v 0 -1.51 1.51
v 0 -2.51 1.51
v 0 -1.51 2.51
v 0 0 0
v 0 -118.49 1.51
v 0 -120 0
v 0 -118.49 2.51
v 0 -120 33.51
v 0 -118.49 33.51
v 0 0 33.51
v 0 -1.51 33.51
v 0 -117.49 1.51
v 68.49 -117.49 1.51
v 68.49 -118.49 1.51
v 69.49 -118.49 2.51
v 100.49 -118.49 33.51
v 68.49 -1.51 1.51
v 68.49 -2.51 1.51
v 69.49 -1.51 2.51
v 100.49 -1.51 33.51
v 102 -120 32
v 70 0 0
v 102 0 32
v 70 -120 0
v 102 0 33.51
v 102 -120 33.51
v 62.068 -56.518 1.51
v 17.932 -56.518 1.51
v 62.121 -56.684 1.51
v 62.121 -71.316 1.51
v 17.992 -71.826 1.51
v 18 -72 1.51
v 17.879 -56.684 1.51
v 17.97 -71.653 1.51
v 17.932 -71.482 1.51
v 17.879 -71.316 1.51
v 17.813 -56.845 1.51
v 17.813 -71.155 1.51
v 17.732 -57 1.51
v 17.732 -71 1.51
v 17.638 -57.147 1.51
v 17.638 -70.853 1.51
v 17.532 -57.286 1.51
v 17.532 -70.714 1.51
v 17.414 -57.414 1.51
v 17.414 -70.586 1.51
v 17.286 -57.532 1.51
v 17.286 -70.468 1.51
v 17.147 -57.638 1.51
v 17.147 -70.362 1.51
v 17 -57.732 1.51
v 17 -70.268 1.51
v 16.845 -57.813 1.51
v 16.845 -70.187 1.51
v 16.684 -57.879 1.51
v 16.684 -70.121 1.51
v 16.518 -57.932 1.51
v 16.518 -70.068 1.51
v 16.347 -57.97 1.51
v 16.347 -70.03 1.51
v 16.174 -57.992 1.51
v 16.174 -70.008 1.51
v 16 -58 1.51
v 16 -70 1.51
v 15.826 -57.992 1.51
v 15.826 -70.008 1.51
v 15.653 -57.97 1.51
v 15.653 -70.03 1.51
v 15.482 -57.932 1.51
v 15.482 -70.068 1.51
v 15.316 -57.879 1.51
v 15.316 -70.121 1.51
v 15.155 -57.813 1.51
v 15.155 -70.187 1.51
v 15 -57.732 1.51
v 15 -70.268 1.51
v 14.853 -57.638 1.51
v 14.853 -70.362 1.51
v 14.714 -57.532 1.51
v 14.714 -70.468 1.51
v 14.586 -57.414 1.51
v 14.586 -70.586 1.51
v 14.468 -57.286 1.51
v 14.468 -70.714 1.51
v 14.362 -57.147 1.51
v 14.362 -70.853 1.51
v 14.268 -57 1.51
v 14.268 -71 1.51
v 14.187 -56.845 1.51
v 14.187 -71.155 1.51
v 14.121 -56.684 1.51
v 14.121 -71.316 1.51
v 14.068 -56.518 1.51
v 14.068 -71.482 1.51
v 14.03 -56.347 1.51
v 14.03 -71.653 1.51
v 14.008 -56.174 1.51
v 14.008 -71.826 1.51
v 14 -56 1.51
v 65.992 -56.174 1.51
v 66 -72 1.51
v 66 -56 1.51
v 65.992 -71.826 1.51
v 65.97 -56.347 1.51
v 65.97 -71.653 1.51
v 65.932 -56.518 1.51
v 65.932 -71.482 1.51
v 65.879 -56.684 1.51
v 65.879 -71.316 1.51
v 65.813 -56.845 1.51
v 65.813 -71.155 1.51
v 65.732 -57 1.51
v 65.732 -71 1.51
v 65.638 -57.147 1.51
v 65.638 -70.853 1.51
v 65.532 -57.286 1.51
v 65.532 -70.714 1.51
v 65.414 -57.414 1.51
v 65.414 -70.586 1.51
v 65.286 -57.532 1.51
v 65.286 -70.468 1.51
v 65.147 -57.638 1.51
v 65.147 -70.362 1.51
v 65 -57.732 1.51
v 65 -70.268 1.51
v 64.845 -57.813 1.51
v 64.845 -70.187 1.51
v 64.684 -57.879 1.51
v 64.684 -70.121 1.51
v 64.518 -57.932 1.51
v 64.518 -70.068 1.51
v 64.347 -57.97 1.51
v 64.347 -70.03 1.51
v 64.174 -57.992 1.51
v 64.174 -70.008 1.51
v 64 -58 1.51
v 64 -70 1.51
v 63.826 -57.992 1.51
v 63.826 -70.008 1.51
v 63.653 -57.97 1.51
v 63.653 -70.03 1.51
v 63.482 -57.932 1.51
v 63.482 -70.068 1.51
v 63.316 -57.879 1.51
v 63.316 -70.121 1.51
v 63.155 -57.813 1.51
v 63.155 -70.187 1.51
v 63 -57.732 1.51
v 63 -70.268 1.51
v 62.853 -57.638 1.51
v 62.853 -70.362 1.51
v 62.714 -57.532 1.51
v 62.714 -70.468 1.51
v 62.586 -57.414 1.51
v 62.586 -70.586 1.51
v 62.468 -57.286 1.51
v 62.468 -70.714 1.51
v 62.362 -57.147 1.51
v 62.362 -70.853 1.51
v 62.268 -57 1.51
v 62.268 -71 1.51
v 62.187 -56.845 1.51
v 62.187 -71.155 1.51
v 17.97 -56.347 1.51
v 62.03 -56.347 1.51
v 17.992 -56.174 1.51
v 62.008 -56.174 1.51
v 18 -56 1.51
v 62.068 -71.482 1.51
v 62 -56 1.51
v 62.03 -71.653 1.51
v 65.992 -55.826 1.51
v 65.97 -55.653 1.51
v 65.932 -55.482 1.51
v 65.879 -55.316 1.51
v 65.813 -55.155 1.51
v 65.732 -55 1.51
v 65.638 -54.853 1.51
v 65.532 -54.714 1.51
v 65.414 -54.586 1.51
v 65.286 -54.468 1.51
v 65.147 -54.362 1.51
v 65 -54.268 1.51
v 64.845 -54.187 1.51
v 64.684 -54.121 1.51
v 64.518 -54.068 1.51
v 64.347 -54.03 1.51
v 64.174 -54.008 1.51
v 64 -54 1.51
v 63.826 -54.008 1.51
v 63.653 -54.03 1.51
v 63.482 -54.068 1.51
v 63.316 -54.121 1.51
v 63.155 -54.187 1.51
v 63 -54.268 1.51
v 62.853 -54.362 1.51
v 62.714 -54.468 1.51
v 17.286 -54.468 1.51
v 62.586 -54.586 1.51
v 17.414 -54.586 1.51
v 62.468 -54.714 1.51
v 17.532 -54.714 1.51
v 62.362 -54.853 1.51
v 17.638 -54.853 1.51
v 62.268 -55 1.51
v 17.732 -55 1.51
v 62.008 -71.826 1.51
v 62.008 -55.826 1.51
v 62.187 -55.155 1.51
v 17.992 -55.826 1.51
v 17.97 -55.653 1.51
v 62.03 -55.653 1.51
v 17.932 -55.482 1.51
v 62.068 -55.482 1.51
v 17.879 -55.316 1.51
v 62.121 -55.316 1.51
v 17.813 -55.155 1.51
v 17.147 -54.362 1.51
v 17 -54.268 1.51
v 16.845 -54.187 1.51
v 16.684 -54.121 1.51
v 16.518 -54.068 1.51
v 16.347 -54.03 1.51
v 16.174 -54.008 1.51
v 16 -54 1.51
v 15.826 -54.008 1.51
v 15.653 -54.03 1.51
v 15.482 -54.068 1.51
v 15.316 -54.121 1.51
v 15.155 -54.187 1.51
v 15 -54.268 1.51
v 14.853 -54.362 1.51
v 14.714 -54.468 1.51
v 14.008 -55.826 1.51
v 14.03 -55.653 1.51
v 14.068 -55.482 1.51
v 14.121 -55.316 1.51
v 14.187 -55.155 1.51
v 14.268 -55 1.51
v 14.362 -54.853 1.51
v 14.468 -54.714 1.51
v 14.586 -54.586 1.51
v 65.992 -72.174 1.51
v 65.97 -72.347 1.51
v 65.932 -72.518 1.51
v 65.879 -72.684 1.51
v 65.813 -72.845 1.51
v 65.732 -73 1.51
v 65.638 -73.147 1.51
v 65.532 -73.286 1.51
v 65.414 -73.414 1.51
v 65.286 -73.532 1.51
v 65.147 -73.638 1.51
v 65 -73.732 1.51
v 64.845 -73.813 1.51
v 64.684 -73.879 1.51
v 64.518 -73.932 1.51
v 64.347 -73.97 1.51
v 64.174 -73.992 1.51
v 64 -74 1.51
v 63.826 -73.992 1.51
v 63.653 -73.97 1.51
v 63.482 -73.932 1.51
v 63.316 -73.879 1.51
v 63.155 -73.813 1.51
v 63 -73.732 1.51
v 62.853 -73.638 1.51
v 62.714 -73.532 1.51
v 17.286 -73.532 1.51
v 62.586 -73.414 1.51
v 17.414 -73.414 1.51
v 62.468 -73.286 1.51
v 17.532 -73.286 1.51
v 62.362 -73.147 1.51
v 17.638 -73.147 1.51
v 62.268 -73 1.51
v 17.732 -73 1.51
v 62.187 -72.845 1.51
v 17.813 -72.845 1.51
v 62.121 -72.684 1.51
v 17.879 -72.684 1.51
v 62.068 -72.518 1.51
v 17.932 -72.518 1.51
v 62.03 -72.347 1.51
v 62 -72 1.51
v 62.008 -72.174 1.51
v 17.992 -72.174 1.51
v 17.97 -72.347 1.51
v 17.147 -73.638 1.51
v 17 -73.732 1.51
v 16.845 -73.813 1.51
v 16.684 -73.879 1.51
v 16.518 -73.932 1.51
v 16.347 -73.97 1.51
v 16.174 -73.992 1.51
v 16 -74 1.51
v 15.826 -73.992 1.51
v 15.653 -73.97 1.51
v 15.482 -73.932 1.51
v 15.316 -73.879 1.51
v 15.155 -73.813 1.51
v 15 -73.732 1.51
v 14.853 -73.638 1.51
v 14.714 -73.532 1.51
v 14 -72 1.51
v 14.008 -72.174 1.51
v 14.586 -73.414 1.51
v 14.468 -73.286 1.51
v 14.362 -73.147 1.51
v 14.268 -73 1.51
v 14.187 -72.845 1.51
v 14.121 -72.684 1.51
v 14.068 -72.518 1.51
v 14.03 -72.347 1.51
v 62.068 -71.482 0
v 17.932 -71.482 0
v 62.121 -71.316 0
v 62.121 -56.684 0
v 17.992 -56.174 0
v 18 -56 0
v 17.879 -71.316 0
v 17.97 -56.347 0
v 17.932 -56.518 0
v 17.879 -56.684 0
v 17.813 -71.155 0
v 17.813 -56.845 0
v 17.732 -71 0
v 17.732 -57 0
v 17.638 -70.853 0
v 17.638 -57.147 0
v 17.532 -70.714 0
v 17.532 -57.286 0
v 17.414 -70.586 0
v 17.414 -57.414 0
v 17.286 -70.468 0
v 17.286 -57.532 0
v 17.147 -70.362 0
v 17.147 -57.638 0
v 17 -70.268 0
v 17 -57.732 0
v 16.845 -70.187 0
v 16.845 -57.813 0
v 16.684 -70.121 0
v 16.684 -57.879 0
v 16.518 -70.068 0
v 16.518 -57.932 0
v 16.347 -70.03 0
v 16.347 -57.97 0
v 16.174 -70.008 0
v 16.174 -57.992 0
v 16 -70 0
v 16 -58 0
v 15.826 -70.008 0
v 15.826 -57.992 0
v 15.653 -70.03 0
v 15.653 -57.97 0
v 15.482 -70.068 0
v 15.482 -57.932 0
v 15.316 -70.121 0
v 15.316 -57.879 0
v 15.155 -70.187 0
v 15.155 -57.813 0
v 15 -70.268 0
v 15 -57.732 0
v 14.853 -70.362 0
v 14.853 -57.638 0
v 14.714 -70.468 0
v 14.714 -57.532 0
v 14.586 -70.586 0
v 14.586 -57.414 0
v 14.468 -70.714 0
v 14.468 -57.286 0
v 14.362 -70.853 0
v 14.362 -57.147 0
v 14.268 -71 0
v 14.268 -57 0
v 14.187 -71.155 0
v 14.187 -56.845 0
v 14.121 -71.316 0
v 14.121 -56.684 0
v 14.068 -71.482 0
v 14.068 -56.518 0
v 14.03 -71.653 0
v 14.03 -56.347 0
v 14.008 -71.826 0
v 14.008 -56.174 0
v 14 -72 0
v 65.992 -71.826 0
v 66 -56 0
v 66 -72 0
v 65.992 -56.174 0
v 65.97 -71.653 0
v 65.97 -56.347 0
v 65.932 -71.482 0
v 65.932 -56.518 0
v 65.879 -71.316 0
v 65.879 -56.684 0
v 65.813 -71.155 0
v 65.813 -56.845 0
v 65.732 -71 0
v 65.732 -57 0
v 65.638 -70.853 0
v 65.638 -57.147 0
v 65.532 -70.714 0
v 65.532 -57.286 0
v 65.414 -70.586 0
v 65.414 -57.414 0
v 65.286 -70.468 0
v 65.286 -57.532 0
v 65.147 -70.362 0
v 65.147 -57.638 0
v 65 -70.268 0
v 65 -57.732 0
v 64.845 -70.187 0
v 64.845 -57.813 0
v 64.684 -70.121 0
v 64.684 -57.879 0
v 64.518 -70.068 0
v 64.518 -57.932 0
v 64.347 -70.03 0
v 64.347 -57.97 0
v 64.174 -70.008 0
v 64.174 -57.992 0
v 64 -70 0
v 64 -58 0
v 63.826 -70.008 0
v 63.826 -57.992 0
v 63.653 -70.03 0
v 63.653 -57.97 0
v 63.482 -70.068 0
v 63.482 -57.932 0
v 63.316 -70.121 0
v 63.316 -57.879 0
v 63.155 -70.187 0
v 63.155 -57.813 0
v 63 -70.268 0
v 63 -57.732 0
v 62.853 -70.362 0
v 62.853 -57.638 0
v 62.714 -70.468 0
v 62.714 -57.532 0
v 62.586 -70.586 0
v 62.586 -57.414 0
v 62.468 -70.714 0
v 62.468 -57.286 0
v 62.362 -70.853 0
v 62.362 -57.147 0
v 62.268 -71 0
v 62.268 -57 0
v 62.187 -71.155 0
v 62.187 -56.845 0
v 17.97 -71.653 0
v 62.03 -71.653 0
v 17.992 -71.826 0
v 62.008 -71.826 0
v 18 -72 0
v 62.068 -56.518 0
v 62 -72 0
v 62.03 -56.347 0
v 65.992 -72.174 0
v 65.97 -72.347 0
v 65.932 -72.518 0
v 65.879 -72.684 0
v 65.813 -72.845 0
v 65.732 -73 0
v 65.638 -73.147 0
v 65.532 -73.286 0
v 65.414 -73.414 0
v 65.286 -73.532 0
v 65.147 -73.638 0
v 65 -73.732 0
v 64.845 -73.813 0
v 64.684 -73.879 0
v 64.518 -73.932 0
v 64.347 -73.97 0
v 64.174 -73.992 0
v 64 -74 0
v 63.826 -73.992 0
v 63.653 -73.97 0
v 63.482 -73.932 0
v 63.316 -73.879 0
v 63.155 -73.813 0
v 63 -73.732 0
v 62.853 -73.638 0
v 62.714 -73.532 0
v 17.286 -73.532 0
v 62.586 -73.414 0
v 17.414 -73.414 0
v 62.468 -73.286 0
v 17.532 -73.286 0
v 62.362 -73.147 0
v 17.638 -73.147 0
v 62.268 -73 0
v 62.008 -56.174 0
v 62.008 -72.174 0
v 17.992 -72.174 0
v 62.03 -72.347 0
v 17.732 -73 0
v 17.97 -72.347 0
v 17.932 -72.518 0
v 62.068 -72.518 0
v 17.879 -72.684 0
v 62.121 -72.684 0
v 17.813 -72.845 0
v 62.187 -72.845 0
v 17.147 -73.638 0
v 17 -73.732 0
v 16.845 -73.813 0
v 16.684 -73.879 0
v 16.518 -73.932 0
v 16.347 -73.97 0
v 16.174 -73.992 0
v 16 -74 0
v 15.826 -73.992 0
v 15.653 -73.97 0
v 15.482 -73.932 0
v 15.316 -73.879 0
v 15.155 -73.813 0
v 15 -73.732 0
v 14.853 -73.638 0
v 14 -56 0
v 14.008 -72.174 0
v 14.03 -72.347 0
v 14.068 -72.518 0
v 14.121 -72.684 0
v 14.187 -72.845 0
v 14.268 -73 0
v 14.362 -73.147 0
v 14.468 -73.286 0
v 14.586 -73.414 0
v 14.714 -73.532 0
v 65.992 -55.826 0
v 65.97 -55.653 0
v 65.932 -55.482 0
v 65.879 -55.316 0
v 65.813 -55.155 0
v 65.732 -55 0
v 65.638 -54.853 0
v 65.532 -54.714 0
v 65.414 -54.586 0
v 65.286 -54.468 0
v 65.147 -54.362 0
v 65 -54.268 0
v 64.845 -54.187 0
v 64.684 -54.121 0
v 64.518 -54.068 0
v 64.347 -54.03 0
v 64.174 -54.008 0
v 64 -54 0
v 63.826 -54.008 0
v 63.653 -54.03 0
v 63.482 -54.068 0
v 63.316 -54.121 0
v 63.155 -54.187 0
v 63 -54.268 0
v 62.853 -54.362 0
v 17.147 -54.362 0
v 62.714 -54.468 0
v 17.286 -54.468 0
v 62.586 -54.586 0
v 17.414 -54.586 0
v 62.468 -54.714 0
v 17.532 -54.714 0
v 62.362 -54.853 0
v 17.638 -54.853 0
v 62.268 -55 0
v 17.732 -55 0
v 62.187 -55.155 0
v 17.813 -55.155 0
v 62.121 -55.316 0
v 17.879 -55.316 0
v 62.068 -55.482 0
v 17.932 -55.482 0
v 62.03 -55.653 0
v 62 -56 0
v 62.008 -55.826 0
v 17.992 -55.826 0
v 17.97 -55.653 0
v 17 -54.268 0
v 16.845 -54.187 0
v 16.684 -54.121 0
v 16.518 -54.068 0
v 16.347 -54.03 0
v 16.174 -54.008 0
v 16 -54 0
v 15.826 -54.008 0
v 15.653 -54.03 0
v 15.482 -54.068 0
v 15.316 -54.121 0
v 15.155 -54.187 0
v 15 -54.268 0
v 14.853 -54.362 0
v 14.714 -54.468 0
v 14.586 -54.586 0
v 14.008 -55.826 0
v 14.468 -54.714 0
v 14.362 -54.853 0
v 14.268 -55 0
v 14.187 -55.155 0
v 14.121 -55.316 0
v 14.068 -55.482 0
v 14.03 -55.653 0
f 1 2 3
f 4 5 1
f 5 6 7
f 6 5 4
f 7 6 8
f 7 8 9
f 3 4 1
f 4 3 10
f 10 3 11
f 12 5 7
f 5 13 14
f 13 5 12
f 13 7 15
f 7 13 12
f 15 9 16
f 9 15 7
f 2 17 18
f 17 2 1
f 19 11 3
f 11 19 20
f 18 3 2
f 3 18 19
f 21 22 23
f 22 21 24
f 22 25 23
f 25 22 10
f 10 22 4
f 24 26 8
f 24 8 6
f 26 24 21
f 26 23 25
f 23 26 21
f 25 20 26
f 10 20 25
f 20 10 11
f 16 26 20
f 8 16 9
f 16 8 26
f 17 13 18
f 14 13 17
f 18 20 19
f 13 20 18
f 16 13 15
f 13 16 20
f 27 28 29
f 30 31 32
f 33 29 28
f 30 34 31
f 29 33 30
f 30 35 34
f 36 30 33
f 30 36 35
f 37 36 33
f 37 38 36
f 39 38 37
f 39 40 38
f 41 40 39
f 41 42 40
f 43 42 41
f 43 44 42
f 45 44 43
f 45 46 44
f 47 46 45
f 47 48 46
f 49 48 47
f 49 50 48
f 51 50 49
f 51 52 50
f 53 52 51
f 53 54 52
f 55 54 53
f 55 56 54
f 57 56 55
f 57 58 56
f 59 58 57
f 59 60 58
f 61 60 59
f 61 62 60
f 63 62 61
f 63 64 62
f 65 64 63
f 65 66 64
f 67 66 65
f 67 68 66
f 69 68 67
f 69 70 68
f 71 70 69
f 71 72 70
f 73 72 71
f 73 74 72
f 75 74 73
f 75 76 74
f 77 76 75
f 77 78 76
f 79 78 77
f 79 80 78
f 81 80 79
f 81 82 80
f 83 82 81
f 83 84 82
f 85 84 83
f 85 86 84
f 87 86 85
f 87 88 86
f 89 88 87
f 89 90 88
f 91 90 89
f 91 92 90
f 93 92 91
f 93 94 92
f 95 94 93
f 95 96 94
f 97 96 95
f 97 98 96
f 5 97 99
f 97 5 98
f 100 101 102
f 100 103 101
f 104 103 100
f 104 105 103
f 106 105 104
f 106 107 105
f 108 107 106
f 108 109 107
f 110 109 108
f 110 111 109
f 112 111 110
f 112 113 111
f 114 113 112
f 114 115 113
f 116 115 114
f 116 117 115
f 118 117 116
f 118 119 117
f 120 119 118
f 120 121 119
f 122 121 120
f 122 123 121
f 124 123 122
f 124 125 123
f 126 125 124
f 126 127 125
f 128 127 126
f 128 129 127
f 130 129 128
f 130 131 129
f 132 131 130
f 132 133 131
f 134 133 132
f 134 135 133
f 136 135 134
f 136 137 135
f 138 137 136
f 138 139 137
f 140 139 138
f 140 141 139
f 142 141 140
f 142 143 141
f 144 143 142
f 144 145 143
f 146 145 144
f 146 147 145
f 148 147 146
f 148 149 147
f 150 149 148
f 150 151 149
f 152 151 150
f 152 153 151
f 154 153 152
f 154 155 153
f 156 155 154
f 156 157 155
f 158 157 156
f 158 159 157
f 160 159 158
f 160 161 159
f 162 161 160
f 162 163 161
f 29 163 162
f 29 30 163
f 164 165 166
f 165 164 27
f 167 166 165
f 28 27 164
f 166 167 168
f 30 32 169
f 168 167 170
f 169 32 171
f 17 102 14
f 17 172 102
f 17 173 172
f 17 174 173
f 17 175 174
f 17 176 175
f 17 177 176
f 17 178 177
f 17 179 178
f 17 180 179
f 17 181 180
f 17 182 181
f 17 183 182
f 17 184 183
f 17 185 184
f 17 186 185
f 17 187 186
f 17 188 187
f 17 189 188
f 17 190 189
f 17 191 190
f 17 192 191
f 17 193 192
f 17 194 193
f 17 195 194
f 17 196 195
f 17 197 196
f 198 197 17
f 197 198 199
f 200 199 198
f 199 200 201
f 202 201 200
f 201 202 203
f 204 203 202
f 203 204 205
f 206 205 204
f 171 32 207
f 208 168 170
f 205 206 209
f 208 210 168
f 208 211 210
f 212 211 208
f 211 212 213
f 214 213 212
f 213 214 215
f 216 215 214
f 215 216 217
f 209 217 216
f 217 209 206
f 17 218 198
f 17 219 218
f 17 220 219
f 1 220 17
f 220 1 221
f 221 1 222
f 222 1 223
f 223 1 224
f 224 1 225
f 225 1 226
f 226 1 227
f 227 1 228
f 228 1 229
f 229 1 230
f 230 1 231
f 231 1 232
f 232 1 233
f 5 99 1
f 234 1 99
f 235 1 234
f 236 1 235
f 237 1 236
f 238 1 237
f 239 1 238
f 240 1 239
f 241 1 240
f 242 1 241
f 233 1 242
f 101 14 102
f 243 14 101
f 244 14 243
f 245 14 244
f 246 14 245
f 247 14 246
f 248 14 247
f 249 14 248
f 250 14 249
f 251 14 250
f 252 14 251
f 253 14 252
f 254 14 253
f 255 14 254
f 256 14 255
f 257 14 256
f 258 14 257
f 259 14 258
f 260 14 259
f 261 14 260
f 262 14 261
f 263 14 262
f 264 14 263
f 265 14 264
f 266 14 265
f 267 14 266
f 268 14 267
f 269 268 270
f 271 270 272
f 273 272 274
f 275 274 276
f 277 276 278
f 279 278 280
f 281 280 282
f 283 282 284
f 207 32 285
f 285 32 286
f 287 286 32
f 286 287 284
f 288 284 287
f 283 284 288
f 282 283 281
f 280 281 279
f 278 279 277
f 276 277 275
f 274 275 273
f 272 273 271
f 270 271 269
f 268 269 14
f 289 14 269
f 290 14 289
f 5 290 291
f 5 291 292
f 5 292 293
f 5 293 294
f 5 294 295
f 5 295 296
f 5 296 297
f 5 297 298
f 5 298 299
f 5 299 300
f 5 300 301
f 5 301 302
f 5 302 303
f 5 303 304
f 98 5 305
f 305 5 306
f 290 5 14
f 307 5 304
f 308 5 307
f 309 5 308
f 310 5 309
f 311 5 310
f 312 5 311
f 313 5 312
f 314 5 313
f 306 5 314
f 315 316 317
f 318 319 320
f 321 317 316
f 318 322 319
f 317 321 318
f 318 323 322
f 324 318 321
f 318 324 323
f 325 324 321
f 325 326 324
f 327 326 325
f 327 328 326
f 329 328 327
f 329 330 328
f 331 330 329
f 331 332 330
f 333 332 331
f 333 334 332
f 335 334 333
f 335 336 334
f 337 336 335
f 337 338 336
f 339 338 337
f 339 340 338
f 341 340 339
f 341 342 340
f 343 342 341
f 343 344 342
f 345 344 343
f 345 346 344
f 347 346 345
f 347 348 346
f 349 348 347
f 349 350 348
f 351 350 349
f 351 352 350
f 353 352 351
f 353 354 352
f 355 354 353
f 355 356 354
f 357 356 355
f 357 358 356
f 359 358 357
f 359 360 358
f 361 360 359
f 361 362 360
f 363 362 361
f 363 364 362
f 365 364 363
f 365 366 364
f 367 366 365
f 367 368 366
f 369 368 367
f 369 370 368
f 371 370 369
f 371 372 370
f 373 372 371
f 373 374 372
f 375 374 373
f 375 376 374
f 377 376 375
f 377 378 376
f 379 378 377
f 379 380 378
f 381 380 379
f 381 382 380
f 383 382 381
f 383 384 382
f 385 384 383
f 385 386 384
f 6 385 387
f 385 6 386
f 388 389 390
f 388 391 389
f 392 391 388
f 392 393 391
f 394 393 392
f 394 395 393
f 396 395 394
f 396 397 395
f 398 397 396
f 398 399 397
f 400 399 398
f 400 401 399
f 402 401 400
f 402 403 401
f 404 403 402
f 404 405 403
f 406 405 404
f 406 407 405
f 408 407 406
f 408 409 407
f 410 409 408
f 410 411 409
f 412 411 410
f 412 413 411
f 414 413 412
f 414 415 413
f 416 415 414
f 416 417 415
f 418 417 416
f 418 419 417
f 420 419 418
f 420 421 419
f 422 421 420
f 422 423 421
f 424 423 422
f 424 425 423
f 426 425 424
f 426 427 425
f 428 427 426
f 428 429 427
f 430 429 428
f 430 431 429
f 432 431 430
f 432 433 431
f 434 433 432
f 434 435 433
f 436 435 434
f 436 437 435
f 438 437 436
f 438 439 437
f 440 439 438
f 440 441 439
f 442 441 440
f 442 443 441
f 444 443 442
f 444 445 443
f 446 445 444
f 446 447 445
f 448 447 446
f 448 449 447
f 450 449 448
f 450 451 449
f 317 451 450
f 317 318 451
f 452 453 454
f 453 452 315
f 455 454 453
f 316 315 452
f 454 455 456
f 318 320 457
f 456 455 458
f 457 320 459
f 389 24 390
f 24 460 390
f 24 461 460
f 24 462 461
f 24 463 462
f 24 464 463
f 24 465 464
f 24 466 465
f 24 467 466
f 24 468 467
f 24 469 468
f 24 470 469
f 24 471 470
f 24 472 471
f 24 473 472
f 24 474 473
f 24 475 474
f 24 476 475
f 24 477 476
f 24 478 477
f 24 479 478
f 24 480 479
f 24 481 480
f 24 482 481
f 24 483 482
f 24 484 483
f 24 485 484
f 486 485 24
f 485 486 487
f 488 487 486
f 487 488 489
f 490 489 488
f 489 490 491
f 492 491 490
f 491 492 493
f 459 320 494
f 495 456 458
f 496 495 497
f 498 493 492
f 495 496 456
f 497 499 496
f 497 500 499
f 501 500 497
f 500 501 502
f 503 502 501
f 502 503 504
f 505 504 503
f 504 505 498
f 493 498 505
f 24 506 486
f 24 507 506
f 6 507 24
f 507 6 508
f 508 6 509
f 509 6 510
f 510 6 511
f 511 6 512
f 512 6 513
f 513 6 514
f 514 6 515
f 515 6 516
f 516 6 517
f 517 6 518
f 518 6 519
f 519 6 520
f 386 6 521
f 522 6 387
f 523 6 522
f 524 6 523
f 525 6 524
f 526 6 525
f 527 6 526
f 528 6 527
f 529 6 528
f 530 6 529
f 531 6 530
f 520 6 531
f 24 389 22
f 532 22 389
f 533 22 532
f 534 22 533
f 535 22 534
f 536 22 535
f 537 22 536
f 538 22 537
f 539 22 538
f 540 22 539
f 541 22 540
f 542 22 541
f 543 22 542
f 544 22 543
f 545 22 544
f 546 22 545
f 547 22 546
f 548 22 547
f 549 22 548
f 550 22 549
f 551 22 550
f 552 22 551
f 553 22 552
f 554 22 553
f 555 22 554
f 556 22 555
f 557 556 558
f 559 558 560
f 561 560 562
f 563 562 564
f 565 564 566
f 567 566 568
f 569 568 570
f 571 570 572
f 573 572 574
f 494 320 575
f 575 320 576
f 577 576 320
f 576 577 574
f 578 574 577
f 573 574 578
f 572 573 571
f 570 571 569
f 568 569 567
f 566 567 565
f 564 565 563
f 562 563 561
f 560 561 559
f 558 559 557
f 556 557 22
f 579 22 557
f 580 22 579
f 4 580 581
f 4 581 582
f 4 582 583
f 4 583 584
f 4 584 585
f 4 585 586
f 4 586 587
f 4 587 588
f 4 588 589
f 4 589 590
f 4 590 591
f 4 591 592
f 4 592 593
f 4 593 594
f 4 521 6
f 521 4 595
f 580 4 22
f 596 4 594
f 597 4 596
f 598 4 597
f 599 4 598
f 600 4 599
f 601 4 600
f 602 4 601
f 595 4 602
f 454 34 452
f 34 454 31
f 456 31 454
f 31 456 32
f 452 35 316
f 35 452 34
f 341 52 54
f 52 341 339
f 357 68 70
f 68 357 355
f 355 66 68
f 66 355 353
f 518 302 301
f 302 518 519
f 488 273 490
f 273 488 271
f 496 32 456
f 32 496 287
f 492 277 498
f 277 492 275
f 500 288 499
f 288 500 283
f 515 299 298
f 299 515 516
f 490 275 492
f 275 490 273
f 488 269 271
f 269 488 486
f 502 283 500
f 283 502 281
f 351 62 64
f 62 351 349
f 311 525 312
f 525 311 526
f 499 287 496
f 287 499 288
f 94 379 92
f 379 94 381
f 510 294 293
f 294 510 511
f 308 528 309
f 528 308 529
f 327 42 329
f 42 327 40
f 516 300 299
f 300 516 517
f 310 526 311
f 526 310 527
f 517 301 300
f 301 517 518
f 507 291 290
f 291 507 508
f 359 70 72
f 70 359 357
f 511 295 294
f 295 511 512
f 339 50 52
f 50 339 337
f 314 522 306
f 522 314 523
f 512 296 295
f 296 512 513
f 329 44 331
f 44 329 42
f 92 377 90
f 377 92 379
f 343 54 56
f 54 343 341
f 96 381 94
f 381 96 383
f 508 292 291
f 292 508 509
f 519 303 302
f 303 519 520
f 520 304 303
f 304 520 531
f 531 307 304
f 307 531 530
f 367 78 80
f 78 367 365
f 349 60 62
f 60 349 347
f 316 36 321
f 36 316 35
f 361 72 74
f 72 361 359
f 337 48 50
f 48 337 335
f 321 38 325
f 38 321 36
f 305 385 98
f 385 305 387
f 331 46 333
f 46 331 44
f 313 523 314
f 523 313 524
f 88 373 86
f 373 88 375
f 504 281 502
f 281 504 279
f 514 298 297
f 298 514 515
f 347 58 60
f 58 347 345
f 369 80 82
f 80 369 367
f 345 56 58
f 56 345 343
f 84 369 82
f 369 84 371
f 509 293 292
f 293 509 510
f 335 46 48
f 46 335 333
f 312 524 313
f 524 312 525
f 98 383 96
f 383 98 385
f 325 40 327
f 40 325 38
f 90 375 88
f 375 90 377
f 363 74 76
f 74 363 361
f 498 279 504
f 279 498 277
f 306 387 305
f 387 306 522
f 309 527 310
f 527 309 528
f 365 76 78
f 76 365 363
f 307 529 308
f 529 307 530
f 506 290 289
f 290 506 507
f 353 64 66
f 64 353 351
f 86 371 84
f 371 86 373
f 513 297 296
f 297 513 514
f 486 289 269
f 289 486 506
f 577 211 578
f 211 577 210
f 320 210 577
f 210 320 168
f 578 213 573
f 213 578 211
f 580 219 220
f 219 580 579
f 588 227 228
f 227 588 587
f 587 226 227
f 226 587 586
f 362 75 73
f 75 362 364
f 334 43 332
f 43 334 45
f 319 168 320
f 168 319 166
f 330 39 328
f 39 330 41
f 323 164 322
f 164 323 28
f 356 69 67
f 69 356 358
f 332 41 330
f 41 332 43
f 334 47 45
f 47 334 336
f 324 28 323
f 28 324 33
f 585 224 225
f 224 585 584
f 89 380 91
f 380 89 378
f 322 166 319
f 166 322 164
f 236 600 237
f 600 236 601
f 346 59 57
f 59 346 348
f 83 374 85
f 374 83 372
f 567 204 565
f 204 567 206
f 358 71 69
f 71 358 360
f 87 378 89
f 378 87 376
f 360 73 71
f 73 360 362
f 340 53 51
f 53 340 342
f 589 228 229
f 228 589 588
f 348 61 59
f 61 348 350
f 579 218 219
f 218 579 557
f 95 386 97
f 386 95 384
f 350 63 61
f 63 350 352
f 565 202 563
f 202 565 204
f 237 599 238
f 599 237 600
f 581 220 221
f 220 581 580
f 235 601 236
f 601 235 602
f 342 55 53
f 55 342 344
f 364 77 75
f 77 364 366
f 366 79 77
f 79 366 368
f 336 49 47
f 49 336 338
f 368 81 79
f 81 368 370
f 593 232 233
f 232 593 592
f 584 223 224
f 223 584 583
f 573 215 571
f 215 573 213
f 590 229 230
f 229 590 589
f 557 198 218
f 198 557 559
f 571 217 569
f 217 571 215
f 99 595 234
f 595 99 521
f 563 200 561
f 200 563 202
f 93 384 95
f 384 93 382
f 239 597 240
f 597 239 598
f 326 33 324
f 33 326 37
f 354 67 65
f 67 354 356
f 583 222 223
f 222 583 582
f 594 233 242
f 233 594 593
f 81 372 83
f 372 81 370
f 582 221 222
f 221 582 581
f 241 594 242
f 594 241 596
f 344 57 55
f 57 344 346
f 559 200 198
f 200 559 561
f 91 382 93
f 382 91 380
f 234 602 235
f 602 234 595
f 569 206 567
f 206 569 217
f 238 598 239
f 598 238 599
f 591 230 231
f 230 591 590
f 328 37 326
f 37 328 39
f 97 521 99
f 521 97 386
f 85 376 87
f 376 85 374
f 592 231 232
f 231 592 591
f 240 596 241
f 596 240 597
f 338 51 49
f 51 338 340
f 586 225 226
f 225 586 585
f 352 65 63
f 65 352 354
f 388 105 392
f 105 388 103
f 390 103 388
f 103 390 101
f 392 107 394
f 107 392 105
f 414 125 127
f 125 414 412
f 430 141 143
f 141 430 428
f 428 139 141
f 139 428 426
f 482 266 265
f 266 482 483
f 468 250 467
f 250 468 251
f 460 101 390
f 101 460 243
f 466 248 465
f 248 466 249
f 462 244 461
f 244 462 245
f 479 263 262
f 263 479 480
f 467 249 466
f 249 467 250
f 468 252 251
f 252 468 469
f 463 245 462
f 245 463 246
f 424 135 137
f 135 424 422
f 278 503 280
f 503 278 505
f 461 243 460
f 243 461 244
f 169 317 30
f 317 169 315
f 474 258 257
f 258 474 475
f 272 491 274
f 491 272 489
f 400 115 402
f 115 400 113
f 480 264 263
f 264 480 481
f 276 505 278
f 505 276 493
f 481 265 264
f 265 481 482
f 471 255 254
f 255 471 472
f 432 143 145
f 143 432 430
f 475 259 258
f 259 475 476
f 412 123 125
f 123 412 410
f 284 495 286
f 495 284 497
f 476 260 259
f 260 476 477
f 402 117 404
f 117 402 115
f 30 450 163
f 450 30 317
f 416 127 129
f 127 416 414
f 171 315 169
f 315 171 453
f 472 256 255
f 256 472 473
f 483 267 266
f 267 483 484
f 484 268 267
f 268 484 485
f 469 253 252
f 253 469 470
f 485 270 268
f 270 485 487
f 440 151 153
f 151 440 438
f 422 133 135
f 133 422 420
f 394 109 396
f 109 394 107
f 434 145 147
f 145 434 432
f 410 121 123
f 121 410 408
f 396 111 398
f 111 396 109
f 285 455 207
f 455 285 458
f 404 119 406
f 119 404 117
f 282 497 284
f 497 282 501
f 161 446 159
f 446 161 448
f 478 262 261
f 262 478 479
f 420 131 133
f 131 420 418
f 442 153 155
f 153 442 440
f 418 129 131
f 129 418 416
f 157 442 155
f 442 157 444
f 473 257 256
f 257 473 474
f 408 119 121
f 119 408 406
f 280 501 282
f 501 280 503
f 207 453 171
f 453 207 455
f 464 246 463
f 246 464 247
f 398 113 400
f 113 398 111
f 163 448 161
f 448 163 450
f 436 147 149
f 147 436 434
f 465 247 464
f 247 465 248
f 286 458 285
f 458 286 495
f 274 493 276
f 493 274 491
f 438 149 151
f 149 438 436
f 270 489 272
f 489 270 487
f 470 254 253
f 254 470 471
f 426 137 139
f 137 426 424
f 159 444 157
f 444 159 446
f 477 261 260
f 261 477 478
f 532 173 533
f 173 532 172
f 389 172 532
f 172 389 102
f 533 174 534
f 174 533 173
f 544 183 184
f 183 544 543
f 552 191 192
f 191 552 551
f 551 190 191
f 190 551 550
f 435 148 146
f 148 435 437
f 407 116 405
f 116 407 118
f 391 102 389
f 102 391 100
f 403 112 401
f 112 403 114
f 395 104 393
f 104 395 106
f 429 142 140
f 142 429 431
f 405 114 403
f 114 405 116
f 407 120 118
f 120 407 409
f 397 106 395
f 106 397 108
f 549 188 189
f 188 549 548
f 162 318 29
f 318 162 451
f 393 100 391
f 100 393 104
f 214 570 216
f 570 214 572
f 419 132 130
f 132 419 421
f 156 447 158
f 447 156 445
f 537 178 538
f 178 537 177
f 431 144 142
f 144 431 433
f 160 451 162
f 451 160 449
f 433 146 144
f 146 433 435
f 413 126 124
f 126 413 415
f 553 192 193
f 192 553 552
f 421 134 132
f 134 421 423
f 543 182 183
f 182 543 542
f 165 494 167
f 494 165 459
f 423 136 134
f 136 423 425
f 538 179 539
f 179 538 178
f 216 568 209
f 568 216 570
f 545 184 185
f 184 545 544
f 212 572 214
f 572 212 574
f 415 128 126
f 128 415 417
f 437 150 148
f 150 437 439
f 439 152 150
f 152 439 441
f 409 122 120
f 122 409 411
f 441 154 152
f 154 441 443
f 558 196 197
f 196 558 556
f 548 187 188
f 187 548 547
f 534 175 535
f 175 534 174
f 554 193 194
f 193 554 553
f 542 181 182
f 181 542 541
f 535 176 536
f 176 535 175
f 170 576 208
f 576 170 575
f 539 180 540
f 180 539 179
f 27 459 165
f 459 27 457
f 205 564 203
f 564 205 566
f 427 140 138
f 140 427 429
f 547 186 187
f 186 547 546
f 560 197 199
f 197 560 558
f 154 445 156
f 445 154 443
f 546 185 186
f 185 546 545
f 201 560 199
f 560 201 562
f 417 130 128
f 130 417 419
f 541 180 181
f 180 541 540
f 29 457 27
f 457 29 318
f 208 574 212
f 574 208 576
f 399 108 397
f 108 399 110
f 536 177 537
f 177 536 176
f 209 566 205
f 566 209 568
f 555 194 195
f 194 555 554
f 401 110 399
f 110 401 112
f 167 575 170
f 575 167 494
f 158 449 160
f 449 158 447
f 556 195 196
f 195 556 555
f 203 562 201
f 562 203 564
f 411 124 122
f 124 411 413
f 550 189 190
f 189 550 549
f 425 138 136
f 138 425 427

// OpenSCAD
$fn = 72;


l = 70;
w = 120;
o = 32;
os2 = o * sqrt(2);
d = 32;
t = 1.51;
t2s = t * sqrt(2);


p0 = [0,0];
p1 = [l, 0];
p2 = [p1.x + o, o];
p3 = [p2.x, p2.y + t];
p4 = [p3.x - t, p3.y];
p5 = [p1.x - t, p1.y + t];
p6 = [p0.x, p0.y + t];
p7 = [p0.x, p4.y];

difference() {
    rotate([90,0,0])
        union() {
            linear_extrude(height = w)
                polygon([p0,p1,p2,p3,p4,p5,p6]);
            linear_extrude(height = t)
                polygon([p0, p1, p2, p4, p4, p7]);
            translate([0,0,w-t])
            linear_extrude(height = t)
                polygon([p0, p1, p2, p4, p4, p7]);
            
            intersection() {
                linear_extrude(height = w)
                    polygon([p0, p1, p2, p4, p4, p7]);
                union() {
                    translate([0,t,w-t])
                        rotate([0,90,0])
                            linear_extrude(height = l + w)
                                polygon([[0,0], [1,0], [0,1]]);
                    translate([0,t,t])
                        rotate([0,90,0])
                            linear_extrude(height = l + w)
                                polygon([[0,0], [-1,0], [0,1]]);
                }
            }
        }

    translate([16, -72,0])
        cylinder(r=2, h = 10, center = true);
    translate([16, -56, 0])
                cylinder(r=2, h = 10, center = true);
    translate([64, -72, 0])
                cylinder(r=2, h = 10, center = true);
    translate([64, -56, 0])
                cylinder(r=2, h = 10, center = true);
}
